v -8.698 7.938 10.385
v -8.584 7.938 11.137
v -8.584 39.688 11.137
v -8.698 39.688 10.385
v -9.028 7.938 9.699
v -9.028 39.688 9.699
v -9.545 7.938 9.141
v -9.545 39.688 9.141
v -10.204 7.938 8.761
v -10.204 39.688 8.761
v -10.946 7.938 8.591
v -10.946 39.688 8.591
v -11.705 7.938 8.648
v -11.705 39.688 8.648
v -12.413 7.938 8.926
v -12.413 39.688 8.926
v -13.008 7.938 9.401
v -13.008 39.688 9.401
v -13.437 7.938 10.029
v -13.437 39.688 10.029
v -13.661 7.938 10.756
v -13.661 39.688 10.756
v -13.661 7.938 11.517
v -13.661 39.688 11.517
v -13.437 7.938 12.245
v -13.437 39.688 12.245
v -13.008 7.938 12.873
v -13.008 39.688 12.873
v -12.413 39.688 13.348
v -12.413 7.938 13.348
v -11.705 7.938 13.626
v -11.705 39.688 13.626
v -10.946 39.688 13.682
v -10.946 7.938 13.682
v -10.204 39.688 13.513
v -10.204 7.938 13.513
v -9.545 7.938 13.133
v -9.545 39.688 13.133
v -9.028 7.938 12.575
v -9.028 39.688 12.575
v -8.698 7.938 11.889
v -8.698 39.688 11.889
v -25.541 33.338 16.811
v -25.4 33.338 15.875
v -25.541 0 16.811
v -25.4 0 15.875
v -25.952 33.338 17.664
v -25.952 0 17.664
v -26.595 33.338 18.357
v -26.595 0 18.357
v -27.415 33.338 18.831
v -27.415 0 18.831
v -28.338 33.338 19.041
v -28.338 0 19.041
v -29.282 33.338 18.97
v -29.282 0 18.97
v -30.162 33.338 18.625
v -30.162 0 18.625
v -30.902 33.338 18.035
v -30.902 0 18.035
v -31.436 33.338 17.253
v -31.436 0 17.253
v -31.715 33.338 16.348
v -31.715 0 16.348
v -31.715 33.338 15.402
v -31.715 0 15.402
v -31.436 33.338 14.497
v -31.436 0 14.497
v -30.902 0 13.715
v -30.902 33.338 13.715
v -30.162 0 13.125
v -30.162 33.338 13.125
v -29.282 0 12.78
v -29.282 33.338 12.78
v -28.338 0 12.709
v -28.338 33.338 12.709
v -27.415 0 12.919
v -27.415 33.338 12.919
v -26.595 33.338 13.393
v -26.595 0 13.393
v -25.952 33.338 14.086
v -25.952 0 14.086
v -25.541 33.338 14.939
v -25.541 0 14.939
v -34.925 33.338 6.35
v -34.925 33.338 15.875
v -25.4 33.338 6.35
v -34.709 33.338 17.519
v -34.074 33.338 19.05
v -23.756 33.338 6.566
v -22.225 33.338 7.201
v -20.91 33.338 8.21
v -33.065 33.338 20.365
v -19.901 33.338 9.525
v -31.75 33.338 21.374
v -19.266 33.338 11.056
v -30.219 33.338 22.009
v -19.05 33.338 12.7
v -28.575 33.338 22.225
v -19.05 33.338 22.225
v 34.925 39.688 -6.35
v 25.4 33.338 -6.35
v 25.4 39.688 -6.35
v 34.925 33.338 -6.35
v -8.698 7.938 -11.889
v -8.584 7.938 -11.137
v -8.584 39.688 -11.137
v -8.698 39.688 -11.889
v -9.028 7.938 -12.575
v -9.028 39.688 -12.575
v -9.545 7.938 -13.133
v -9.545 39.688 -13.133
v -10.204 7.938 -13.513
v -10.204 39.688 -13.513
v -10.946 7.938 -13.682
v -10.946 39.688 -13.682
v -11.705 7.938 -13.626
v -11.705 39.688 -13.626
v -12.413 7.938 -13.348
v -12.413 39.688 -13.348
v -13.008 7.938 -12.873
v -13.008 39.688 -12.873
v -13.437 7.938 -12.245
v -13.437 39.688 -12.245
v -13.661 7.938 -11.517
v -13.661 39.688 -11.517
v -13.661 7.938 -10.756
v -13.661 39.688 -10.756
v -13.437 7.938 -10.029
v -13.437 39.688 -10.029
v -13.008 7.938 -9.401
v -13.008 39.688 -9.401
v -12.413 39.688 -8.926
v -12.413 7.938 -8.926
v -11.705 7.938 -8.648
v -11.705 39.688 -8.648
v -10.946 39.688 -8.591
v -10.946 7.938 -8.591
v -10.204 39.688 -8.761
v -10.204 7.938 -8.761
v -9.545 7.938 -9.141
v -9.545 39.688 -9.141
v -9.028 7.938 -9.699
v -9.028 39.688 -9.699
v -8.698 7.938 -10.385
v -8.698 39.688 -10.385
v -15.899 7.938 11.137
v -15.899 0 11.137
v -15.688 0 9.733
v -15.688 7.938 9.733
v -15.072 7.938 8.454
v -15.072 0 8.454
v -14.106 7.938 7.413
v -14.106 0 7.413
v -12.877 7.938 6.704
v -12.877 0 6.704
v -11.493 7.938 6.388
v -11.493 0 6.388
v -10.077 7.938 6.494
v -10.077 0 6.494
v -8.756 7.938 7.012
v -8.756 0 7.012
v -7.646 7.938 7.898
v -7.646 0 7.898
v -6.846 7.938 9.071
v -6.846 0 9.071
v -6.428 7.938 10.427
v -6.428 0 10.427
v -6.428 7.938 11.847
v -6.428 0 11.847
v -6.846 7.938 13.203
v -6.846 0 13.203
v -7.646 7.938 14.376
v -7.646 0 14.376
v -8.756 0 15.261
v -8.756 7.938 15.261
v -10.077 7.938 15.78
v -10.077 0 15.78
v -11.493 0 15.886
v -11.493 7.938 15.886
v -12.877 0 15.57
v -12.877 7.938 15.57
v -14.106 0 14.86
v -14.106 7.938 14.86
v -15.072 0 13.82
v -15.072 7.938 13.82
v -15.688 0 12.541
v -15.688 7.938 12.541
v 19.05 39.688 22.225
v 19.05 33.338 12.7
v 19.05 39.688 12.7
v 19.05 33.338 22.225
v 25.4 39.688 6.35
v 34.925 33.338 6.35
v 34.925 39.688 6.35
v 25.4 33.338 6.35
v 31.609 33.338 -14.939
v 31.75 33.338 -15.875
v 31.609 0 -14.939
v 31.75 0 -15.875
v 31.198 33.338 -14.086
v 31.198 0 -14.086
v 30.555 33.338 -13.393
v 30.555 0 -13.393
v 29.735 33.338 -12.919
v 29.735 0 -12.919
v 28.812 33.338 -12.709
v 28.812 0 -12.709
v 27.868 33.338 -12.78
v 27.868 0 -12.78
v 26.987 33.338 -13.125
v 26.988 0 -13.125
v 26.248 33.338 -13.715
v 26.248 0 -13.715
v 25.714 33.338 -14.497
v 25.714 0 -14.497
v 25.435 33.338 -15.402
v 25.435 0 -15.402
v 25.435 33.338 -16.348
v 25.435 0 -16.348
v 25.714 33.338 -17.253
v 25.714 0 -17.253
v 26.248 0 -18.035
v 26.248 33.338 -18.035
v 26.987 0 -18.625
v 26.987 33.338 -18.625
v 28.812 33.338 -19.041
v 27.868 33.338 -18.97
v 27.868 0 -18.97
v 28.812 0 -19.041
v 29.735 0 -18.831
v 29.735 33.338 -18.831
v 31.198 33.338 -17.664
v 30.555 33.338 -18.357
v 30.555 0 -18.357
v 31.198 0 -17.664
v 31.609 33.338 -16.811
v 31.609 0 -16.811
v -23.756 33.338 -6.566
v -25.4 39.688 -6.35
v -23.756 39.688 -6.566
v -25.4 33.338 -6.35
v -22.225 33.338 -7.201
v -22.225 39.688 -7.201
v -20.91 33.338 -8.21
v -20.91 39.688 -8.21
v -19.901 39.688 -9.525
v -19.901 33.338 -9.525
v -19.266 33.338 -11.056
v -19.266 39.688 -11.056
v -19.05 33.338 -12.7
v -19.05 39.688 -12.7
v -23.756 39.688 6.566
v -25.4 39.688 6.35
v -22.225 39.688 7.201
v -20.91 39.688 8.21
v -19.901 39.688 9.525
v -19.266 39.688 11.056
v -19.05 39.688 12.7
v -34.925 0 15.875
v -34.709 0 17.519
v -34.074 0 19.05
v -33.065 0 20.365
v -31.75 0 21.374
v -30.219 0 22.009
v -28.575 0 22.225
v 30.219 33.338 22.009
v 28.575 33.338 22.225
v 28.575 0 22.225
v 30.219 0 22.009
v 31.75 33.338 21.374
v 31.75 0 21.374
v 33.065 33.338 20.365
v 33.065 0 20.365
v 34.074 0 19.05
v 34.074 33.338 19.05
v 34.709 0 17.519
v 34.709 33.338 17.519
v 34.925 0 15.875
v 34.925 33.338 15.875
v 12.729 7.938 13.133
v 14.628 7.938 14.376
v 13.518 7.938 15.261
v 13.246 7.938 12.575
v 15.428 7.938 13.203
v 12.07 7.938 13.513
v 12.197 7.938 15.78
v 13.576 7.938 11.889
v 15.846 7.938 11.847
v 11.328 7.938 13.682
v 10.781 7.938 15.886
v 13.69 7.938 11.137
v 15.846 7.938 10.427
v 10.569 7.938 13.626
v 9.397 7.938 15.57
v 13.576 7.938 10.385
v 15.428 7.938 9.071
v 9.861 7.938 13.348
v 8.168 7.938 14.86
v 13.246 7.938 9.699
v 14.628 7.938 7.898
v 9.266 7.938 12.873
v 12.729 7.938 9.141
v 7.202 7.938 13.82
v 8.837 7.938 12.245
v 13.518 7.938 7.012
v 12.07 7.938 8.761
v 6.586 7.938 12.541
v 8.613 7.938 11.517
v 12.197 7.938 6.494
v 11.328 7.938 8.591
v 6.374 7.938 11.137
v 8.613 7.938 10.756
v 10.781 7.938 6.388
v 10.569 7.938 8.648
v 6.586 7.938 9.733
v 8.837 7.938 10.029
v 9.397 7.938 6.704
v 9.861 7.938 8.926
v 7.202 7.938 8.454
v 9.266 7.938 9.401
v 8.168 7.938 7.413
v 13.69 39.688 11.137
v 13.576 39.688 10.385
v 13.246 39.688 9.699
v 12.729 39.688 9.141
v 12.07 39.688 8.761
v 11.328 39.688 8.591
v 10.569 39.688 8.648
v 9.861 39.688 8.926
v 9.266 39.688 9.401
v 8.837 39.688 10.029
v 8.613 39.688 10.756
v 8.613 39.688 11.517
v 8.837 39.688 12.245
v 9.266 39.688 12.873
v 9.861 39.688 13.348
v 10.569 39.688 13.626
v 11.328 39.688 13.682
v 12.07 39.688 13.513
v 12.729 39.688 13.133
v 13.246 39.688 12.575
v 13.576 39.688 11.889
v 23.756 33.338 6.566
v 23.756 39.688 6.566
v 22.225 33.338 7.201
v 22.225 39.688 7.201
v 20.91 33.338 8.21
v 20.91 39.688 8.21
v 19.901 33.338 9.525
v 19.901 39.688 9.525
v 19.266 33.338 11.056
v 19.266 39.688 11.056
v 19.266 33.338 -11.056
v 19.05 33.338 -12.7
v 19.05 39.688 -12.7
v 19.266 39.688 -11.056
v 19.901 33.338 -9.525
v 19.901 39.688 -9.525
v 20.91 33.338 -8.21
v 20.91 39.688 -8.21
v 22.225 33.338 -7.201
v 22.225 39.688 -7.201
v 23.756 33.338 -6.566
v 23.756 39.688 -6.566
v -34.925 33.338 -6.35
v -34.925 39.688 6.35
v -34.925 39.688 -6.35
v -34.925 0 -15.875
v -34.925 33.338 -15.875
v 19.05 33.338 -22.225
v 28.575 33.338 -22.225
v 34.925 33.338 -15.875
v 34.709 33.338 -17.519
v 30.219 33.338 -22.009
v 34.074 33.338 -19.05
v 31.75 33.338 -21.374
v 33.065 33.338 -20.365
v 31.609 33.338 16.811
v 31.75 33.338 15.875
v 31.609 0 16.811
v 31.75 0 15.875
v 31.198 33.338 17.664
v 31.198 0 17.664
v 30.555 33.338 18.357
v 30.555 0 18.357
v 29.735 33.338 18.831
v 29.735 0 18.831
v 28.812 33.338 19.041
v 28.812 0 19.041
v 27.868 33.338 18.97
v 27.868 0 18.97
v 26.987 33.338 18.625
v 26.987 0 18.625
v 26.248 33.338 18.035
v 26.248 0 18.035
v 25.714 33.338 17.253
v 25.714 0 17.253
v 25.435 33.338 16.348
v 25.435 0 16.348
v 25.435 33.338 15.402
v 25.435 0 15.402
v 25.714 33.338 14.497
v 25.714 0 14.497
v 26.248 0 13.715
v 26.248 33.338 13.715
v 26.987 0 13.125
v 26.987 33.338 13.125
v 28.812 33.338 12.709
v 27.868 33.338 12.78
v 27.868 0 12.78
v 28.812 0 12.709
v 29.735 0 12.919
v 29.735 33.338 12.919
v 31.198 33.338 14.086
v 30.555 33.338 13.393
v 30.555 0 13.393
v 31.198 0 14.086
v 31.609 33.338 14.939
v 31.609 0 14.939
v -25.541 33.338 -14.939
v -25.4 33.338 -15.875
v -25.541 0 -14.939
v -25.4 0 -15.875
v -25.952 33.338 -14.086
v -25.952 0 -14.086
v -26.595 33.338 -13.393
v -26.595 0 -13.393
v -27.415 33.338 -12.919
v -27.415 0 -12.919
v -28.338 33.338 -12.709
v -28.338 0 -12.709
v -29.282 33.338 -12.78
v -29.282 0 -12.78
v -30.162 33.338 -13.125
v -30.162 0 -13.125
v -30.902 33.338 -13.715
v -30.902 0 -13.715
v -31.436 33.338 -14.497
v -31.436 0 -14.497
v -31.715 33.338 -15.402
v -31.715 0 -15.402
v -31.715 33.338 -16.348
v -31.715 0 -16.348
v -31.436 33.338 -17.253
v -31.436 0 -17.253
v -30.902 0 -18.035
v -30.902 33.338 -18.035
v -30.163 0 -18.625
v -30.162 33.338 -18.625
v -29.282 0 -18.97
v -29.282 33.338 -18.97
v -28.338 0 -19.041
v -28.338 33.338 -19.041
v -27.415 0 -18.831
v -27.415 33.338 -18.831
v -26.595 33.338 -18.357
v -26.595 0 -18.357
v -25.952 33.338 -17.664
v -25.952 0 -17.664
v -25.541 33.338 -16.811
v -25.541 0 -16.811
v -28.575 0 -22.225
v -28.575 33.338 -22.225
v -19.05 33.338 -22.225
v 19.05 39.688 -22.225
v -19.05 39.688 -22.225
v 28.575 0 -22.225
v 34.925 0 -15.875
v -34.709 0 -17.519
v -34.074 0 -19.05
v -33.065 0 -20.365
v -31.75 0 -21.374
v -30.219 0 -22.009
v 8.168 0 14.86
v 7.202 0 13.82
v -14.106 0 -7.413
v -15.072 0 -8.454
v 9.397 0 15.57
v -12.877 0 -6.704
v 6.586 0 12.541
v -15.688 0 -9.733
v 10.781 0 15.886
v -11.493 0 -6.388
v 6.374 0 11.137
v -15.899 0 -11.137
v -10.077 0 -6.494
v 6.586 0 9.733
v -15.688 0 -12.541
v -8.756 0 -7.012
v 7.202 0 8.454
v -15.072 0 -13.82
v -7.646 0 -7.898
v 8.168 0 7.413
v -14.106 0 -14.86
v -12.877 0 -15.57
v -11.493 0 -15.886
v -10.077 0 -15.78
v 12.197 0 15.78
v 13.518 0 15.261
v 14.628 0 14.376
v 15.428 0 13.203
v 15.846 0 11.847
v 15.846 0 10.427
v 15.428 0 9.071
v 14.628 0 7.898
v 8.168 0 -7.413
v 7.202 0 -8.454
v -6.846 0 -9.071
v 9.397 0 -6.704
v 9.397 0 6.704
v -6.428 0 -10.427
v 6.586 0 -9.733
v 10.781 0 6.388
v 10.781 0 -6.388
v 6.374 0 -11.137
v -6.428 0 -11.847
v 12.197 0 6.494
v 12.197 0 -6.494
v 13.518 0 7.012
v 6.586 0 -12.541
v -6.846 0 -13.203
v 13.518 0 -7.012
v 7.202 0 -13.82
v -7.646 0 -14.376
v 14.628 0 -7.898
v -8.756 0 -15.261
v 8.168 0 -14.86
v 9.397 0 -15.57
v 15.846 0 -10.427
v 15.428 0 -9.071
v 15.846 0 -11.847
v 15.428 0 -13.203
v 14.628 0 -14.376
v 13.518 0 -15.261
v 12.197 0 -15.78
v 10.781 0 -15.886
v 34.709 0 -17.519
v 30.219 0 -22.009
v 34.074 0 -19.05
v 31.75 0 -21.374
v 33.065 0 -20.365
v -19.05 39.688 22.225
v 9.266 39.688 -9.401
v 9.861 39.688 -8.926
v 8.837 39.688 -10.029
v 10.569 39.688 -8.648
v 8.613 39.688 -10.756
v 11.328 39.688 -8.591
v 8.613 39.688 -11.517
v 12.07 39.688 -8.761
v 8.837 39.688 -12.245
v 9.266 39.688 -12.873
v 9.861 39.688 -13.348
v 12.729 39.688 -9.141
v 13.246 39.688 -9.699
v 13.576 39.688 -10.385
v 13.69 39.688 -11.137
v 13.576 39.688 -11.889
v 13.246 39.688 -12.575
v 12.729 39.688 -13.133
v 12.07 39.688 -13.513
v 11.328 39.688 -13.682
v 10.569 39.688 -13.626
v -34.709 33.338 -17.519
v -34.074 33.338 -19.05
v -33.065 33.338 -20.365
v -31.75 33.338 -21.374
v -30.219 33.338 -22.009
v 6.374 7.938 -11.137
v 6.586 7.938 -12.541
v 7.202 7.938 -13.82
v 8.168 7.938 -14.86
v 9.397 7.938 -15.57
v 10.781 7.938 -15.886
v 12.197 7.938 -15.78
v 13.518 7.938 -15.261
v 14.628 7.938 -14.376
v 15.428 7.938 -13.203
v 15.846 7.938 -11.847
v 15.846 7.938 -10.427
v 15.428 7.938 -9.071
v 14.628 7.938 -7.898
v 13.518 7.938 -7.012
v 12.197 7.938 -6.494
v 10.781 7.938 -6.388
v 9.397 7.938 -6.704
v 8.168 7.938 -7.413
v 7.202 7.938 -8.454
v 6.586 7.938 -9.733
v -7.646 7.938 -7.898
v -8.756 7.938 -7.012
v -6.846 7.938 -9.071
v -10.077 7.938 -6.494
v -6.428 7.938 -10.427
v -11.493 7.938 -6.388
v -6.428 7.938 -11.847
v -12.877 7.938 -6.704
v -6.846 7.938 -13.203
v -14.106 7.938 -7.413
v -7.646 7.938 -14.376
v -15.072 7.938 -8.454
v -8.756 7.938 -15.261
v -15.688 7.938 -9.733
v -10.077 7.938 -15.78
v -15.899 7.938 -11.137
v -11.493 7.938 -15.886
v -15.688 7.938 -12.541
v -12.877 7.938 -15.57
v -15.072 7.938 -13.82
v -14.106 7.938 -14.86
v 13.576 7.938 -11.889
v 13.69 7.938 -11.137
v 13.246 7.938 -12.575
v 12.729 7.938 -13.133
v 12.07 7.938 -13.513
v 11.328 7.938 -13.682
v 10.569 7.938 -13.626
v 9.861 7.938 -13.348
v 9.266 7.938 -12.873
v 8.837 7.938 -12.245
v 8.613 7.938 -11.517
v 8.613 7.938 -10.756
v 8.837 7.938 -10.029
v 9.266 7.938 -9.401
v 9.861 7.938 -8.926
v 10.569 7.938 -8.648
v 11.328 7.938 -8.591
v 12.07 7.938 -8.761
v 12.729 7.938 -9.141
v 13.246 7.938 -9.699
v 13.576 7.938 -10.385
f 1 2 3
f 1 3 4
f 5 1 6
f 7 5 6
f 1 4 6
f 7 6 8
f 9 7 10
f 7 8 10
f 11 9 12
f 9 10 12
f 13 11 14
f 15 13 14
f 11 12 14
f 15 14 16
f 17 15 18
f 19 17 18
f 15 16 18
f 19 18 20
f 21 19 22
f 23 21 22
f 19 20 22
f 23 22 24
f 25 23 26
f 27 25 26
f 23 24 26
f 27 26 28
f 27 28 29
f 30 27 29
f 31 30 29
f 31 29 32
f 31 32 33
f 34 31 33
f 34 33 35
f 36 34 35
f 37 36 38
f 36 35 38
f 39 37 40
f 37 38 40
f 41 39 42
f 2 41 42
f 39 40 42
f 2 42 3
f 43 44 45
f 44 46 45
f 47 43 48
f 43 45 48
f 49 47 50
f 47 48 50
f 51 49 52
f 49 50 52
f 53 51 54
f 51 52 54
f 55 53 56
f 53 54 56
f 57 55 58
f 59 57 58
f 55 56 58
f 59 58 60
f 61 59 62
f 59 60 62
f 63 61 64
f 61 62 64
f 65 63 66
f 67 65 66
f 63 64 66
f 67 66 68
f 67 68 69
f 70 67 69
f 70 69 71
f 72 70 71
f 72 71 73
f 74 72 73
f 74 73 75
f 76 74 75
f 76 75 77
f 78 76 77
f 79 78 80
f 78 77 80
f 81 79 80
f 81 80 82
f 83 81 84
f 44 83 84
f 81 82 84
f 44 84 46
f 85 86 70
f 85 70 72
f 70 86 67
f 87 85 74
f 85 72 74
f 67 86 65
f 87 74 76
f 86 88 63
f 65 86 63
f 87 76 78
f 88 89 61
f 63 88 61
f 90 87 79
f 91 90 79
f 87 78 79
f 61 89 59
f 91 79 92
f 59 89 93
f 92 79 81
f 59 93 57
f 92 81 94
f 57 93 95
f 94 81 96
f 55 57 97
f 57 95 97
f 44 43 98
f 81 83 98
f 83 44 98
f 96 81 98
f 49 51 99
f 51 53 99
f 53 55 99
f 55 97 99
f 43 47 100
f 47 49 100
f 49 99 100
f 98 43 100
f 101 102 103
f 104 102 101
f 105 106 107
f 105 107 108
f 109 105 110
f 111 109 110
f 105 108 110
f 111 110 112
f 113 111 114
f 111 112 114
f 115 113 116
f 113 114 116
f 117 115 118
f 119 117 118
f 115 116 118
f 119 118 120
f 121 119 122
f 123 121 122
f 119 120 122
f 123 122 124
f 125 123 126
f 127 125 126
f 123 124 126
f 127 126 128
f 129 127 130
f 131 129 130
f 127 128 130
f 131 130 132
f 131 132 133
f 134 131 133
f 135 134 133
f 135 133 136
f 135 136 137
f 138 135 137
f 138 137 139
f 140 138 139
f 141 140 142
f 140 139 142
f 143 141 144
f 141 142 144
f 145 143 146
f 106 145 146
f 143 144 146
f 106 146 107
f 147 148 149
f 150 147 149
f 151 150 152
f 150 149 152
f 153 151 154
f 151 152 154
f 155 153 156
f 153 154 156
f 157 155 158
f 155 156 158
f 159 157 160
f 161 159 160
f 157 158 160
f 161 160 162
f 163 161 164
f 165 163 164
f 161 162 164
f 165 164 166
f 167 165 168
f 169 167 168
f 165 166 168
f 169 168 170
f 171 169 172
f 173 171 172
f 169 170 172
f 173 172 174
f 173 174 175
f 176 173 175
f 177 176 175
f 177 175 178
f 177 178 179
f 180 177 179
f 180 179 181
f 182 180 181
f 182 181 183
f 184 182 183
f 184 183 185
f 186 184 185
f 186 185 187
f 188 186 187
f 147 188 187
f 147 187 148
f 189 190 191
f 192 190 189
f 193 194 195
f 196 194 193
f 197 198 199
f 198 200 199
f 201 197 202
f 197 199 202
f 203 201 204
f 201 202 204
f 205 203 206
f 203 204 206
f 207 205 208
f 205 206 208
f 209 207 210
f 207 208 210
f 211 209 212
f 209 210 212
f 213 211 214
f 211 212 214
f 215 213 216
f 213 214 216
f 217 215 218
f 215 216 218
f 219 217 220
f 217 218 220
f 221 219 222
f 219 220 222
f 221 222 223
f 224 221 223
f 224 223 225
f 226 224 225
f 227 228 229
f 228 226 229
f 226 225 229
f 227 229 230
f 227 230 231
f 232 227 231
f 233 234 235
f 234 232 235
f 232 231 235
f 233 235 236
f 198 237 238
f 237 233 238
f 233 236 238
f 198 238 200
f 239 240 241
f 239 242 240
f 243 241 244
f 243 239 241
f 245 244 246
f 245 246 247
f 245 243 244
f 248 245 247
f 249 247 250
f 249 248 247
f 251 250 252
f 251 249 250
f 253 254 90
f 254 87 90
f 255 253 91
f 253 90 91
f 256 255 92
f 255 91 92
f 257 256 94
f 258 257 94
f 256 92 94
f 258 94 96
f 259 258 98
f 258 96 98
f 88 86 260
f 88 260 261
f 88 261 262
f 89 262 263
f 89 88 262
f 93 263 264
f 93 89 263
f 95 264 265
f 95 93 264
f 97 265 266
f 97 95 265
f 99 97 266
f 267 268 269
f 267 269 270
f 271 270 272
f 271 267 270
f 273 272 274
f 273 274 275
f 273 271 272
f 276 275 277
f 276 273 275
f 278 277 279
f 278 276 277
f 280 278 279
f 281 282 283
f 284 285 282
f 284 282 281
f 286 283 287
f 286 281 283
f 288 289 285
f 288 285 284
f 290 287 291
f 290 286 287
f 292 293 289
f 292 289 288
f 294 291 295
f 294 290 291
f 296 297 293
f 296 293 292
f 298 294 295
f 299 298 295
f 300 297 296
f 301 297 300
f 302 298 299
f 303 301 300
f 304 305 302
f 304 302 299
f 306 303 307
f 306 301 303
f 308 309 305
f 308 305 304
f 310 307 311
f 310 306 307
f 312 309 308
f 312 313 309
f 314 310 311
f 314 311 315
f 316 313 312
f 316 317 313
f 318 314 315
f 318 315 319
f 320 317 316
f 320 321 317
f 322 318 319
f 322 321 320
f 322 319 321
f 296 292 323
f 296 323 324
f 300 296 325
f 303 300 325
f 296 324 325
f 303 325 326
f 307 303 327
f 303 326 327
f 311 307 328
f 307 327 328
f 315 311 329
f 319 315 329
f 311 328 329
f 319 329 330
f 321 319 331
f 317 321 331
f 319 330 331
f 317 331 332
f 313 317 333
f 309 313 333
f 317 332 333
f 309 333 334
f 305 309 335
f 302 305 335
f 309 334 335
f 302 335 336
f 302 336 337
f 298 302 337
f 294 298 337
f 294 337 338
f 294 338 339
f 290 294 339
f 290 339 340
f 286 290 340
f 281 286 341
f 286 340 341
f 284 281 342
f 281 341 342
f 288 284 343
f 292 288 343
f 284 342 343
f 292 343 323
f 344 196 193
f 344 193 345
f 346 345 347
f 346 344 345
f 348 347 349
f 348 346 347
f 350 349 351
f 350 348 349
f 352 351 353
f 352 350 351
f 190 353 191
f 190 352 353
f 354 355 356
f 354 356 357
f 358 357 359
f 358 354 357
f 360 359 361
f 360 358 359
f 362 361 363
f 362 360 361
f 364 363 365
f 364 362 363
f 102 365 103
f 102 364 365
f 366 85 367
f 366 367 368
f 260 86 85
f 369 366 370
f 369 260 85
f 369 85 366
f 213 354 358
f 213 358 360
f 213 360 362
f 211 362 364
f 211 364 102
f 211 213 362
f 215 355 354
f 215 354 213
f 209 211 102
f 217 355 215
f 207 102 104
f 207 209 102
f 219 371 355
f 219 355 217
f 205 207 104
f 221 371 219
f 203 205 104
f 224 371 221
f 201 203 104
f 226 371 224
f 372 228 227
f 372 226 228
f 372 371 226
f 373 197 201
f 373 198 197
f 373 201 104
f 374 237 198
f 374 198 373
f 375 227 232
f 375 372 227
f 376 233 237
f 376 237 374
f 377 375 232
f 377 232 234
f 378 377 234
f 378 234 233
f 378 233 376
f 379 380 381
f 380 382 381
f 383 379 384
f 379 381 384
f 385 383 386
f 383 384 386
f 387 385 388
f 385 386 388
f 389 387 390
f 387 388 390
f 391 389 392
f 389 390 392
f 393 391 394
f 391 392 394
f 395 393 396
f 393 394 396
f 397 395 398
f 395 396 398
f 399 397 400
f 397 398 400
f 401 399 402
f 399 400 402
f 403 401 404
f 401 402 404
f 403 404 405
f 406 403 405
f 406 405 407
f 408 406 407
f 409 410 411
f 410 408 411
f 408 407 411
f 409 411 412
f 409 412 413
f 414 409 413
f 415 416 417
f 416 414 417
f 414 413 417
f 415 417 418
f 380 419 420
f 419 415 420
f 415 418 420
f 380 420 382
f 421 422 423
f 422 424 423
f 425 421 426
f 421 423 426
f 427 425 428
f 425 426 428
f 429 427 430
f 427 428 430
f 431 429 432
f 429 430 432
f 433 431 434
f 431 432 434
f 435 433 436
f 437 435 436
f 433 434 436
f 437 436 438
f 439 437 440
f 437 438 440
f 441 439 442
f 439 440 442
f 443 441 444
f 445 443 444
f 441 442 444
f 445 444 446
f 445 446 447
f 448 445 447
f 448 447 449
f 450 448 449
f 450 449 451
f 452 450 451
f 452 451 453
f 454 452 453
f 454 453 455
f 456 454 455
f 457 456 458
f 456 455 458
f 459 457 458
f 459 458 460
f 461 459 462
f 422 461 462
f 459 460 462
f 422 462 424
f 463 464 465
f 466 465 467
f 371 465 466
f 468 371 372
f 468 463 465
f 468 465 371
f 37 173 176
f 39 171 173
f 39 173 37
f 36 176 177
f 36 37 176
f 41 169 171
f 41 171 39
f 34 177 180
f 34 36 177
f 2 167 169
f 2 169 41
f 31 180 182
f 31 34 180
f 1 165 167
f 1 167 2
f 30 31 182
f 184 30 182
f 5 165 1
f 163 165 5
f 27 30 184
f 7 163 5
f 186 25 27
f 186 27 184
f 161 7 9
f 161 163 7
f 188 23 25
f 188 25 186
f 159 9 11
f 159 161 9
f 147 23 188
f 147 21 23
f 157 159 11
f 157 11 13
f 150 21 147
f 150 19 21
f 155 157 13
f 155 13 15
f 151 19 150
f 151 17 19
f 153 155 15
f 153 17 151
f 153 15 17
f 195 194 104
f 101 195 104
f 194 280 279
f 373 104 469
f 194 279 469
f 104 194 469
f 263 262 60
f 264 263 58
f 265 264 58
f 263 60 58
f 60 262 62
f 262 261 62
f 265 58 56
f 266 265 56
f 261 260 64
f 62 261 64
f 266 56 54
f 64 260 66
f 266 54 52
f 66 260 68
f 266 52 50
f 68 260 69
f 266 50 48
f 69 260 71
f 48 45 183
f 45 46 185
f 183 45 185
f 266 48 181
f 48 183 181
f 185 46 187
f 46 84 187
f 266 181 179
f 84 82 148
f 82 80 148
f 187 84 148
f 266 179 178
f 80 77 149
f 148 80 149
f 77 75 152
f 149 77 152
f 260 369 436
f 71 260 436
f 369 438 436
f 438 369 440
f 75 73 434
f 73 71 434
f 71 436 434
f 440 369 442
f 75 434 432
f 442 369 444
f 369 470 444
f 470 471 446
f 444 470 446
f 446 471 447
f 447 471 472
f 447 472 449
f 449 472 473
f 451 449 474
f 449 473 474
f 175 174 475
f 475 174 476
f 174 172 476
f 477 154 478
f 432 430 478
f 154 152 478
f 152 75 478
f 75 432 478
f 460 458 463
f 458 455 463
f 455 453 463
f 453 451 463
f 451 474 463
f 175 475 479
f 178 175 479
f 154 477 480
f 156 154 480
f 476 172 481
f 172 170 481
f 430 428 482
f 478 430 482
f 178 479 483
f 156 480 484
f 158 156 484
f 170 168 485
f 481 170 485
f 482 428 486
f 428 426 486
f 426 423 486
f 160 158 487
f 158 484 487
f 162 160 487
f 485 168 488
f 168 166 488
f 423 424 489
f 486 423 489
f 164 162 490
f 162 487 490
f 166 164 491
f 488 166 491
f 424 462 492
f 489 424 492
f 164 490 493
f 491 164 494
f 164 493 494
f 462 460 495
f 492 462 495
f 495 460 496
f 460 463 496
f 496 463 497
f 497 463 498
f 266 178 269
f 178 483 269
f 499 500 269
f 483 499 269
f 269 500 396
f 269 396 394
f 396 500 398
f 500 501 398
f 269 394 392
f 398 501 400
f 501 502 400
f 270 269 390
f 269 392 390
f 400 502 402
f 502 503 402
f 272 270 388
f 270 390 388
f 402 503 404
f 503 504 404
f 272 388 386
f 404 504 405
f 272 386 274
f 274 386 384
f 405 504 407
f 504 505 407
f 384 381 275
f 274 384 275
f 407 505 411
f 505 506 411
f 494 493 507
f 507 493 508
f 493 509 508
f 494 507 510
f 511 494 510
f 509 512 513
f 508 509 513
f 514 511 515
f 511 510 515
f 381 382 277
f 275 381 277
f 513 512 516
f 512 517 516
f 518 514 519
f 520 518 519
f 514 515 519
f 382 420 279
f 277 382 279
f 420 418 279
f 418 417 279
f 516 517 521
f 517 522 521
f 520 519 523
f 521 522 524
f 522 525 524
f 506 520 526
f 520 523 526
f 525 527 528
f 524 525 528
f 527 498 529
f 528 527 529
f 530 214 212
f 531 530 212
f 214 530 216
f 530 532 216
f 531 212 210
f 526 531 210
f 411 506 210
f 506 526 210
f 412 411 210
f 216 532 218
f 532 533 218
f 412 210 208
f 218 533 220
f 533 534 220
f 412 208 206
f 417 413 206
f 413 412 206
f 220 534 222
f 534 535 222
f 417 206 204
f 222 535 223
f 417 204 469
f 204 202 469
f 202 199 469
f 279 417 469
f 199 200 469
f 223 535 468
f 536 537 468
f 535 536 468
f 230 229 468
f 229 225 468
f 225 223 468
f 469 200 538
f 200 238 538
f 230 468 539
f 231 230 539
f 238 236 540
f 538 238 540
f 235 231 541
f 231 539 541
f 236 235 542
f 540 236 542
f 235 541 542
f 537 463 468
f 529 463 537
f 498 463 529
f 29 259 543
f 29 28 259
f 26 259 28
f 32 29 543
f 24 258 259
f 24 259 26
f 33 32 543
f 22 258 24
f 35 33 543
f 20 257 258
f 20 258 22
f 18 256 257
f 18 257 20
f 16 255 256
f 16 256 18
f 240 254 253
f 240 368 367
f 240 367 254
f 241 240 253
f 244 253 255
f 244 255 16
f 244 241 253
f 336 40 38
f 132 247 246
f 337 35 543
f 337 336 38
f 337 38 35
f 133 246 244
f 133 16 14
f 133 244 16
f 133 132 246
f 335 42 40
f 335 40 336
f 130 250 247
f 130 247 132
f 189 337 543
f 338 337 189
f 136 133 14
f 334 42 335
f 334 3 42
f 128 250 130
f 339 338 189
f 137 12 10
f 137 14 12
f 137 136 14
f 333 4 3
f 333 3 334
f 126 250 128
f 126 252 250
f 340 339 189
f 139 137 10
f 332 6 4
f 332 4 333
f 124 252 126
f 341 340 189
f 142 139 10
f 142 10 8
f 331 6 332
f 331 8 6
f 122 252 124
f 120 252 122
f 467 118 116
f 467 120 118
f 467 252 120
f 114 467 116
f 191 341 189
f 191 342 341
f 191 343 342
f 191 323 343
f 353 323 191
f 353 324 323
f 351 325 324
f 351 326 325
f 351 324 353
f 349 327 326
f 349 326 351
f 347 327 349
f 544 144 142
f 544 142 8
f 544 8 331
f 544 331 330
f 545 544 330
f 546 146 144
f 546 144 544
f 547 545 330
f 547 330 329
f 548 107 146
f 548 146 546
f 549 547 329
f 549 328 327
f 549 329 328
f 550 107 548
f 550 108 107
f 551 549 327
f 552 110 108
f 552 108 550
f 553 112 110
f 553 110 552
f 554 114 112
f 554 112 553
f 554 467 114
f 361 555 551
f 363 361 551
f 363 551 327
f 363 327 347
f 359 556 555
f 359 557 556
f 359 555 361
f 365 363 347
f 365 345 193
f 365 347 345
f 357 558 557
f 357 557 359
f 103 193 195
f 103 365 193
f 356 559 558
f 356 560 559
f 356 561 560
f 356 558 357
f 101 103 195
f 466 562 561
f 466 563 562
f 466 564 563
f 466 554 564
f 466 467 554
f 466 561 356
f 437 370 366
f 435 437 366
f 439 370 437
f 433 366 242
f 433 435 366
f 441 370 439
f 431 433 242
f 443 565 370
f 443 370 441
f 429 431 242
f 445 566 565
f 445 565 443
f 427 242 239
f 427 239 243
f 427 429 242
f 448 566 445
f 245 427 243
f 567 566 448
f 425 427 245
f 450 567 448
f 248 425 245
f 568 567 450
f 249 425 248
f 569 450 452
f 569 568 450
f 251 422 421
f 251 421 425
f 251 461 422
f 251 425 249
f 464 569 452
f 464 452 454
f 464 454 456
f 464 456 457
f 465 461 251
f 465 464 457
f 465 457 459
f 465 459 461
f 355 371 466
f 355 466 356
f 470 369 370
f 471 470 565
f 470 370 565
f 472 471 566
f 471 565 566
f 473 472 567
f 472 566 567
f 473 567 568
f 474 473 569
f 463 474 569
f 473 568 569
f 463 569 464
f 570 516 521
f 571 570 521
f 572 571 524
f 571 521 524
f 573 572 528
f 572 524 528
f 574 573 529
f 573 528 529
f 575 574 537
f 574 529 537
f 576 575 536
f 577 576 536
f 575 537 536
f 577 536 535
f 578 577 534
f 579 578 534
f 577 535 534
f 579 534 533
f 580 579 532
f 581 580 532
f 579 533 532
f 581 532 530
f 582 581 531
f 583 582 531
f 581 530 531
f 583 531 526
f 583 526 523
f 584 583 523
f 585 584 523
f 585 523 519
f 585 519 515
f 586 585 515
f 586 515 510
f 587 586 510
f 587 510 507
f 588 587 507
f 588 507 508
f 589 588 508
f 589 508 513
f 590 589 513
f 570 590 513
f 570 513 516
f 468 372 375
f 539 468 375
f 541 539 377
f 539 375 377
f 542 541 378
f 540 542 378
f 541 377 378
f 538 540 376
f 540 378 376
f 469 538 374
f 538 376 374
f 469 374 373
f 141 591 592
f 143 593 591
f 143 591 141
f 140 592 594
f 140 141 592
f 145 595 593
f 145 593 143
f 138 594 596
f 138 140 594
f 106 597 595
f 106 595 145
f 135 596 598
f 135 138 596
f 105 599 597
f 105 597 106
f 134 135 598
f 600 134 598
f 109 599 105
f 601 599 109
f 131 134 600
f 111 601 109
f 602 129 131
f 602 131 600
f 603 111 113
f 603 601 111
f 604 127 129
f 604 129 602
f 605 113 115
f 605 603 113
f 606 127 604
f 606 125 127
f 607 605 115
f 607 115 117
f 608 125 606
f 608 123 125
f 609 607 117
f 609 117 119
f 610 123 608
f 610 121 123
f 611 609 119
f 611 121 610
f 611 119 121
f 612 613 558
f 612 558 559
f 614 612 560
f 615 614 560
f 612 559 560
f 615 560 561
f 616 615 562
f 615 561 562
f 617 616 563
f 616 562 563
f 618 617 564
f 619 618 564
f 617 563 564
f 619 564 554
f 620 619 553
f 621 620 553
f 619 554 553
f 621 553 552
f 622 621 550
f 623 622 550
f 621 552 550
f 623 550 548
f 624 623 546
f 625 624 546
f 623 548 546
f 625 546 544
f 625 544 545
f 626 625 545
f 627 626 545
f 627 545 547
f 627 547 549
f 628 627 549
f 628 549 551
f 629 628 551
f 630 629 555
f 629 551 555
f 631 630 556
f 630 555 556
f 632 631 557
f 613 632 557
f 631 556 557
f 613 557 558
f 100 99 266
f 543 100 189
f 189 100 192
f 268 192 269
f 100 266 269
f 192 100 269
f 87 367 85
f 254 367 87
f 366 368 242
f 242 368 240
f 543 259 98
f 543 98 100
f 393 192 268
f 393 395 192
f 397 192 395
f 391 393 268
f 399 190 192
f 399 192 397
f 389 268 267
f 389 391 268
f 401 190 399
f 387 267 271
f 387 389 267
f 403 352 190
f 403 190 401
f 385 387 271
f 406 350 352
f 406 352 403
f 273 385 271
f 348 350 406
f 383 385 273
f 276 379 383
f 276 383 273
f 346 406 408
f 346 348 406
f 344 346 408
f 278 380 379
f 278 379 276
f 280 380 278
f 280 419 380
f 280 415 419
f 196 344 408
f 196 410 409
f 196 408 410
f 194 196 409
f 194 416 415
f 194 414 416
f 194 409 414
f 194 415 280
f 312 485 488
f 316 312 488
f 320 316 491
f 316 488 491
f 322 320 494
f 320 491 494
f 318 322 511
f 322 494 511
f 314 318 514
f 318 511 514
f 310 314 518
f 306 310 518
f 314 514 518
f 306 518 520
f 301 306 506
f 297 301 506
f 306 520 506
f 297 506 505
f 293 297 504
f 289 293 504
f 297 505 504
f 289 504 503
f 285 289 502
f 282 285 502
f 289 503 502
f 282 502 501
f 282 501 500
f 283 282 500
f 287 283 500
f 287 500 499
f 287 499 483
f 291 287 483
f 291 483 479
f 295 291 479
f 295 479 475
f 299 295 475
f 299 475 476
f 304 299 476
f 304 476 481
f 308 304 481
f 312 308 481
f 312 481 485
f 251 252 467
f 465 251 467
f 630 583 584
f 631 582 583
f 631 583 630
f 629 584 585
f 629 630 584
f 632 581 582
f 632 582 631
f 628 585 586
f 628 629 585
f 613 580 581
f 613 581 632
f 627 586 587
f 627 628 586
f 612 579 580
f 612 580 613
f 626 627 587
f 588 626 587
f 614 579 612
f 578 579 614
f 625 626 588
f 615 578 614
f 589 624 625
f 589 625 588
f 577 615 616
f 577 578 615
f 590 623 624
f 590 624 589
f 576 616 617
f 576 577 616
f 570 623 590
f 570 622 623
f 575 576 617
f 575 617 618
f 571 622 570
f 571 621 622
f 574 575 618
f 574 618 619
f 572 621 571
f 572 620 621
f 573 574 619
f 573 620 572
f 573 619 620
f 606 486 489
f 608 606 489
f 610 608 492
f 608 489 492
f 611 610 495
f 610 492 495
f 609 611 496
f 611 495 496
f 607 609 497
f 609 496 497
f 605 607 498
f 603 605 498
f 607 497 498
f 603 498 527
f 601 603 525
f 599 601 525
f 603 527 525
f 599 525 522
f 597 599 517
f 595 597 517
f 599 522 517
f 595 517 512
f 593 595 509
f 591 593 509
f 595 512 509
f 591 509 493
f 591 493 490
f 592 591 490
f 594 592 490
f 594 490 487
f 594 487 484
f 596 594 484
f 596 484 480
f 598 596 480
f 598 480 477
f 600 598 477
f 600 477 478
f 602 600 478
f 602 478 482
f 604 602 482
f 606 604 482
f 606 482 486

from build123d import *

# Parameters (mm, degrees)
SKETCH1_W                                           = 69.85
SKETCH1_H                                           = 44.45
BOSS_EXTRUDE1_DEPTH                                 = 39.6875
CBORE_FOR_10_BINDING_HEAD_MACHINE_SCREW_D           = 5.1054
CBORE_FOR_10_BINDING_HEAD_MACHINE_SCREW_CBORE_D     = 9.525
CBORE_FOR_10_BINDING_HEAD_MACHINE_SCREW_CBORE_DEPTH = 7.9375
FILLET2_R                                           = 6.35
F_1_4_0_25_DIAMETER_HOLE1_D                         = 6.35
SKETCH9_W                                           = 15.875
SKETCH9_H                                           = 15.875
CUT_EXTRUDE1_DEPTH                                  = 6.35
FILLET3_R                                           = 6.35
FILLET3_OF_MIRROR2_R                                = 6.35
MIRROR3_START                                       = 33.3375
MIRROR3_OUTLINE_R                                   = 3.175
MIRROR3_DEPTH                                       = 6.35


# Read off the part's stored shape, not the designer's step: Mirror3
with BuildPart() as part:
    # Sketch1 → Boss-Extrude1 (new body)
    with BuildSketch(Plane(origin=(0, 0, 0), x_dir=(1, 0, 0), z_dir=(0, 1, 0))):
        Rectangle(SKETCH1_W, SKETCH1_H)
    extrude(amount=BOSS_EXTRUDE1_DEPTH)

    # CBORE for #10 Binding Head Machine Screw1 (through all)
    with Locations(Plane(origin=(0, 0, 0), x_dir=(-1, 0, 0), z_dir=(0, -1, 0))):
        with Locations((-11.136931804, 11.136931804), (11.136931804, 11.136931804), (11.136931804, -11.136931804), (-11.136931804, -11.136931804)):
            CounterBoreHole(CBORE_FOR_10_BINDING_HEAD_MACHINE_SCREW_D / 2, CBORE_FOR_10_BINDING_HEAD_MACHINE_SCREW_CBORE_D / 2, CBORE_FOR_10_BINDING_HEAD_MACHINE_SCREW_CBORE_DEPTH)

    # Fillet2
    fillet2_edges = [part.edges().sort_by_distance(p)[0] for p in [
        (34.925, 19.84375, 22.225),
        (-34.925, 19.84375, 22.225),
        (-34.925, 19.84375, -22.225),
        (34.925, 19.84375, -22.225),
    ]]
    fillet(fillet2_edges, radius=FILLET2_R)

    # 1/4 (0.25) Diameter Hole1 (through all)
    with Locations(Plane(origin=(0, 39.6875, 0), x_dir=(-1, 0, 0), z_dir=(0, 1, 0))):
        with Locations((-28.575, -15.875), (-28.575, 15.875), (28.575, 15.875), (28.575, -15.875)):
            f_1_4_0_25_diameter_hole1 = Hole(F_1_4_0_25_DIAMETER_HOLE1_D / 2)

    # Mirror1: 1/4 (0.25) Diameter Hole1 across plane
    add(f_1_4_0_25_diameter_hole1.mirror(Plane(origin=(0, 0, 0), x_dir=(0, 0, 1), z_dir=(1, 0, 0))), mode=Mode.SUBTRACT)

    # Sketch9 → Cut-Extrude1 (cut)
    with BuildSketch(Plane(origin=(0, 39.6875, 0), x_dir=(1, 0, 0), z_dir=(0, 1, 0))):
        with Locations((-26.9875, 14.2875)):
            Rectangle(SKETCH9_W, SKETCH9_H)
    cut_extrude1 = extrude(amount=-CUT_EXTRUDE1_DEPTH, mode=Mode.SUBTRACT)

    # Fillet3
    fillet3_edges = [part.edges().sort_by_distance(p)[0] for p in [
        (-19.05, 36.5125, -6.35),
    ]]
    fillet(fillet3_edges, radius=FILLET3_R)

    # Mirror2: Cut-Extrude1 across plane
    add(cut_extrude1.mirror(Plane.XY), mode=Mode.SUBTRACT)

    # Fillet3 of Mirror2
    fillet3_of_mirror2_edges = [part.edges().sort_by_distance(p)[0] for p in [
        (-19.05, 36.5125, 6.35),
    ]]
    fillet(fillet3_of_mirror2_edges, radius=FILLET3_OF_MIRROR2_R)

    # Mirror3 outline → Mirror3 (cut)
    # profile 1 of 2: a face of its own
    with BuildSketch(Plane(origin=(0, 0, 0), x_dir=(1, 0, 0), z_dir=(0, 1, 0)).offset(MIRROR3_START)):
        with BuildLine():
            Line((25.4, 6.35), (34.925, 6.35))
            Line((34.925, 6.35), (34.925, 15.875))
            ThreePointArc((34.925, 15.875), (33.065128061, 20.365128061), (28.575, 22.225))
            Line((28.575, 22.225), (19.05, 22.225))
            Line((19.05, 22.225), (19.05, 12.7))
            ThreePointArc((19.05, 12.7), (20.909871939, 8.209871939), (25.4, 6.35))
        make_face()
        with Locations((28.575, 15.875)):
            Circle(MIRROR3_OUTLINE_R, mode=Mode.SUBTRACT)
    # profile 2 of 2: a face of its own
    with BuildSketch(Plane(origin=(0, 0, 0), x_dir=(1, 0, 0), z_dir=(0, 1, 0)).offset(MIRROR3_START)):
        with BuildLine():
            Line((34.925, -15.875), (34.925, -6.35))
            Line((34.925, -6.35), (25.4, -6.35))
            ThreePointArc((25.4, -6.35), (20.909871939, -8.209871939), (19.05, -12.7))
            Line((19.05, -12.7), (19.05, -22.225))
            Line((19.05, -22.225), (28.575, -22.225))
            ThreePointArc((28.575, -22.225), (33.065128061, -20.365128061), (34.925, -15.875))
        make_face()
        with Locations((28.575, -15.875)):
            Circle(MIRROR3_OUTLINE_R, mode=Mode.SUBTRACT)
    extrude(amount=MIRROR3_DEPTH, mode=Mode.SUBTRACT)


solid = part.part
